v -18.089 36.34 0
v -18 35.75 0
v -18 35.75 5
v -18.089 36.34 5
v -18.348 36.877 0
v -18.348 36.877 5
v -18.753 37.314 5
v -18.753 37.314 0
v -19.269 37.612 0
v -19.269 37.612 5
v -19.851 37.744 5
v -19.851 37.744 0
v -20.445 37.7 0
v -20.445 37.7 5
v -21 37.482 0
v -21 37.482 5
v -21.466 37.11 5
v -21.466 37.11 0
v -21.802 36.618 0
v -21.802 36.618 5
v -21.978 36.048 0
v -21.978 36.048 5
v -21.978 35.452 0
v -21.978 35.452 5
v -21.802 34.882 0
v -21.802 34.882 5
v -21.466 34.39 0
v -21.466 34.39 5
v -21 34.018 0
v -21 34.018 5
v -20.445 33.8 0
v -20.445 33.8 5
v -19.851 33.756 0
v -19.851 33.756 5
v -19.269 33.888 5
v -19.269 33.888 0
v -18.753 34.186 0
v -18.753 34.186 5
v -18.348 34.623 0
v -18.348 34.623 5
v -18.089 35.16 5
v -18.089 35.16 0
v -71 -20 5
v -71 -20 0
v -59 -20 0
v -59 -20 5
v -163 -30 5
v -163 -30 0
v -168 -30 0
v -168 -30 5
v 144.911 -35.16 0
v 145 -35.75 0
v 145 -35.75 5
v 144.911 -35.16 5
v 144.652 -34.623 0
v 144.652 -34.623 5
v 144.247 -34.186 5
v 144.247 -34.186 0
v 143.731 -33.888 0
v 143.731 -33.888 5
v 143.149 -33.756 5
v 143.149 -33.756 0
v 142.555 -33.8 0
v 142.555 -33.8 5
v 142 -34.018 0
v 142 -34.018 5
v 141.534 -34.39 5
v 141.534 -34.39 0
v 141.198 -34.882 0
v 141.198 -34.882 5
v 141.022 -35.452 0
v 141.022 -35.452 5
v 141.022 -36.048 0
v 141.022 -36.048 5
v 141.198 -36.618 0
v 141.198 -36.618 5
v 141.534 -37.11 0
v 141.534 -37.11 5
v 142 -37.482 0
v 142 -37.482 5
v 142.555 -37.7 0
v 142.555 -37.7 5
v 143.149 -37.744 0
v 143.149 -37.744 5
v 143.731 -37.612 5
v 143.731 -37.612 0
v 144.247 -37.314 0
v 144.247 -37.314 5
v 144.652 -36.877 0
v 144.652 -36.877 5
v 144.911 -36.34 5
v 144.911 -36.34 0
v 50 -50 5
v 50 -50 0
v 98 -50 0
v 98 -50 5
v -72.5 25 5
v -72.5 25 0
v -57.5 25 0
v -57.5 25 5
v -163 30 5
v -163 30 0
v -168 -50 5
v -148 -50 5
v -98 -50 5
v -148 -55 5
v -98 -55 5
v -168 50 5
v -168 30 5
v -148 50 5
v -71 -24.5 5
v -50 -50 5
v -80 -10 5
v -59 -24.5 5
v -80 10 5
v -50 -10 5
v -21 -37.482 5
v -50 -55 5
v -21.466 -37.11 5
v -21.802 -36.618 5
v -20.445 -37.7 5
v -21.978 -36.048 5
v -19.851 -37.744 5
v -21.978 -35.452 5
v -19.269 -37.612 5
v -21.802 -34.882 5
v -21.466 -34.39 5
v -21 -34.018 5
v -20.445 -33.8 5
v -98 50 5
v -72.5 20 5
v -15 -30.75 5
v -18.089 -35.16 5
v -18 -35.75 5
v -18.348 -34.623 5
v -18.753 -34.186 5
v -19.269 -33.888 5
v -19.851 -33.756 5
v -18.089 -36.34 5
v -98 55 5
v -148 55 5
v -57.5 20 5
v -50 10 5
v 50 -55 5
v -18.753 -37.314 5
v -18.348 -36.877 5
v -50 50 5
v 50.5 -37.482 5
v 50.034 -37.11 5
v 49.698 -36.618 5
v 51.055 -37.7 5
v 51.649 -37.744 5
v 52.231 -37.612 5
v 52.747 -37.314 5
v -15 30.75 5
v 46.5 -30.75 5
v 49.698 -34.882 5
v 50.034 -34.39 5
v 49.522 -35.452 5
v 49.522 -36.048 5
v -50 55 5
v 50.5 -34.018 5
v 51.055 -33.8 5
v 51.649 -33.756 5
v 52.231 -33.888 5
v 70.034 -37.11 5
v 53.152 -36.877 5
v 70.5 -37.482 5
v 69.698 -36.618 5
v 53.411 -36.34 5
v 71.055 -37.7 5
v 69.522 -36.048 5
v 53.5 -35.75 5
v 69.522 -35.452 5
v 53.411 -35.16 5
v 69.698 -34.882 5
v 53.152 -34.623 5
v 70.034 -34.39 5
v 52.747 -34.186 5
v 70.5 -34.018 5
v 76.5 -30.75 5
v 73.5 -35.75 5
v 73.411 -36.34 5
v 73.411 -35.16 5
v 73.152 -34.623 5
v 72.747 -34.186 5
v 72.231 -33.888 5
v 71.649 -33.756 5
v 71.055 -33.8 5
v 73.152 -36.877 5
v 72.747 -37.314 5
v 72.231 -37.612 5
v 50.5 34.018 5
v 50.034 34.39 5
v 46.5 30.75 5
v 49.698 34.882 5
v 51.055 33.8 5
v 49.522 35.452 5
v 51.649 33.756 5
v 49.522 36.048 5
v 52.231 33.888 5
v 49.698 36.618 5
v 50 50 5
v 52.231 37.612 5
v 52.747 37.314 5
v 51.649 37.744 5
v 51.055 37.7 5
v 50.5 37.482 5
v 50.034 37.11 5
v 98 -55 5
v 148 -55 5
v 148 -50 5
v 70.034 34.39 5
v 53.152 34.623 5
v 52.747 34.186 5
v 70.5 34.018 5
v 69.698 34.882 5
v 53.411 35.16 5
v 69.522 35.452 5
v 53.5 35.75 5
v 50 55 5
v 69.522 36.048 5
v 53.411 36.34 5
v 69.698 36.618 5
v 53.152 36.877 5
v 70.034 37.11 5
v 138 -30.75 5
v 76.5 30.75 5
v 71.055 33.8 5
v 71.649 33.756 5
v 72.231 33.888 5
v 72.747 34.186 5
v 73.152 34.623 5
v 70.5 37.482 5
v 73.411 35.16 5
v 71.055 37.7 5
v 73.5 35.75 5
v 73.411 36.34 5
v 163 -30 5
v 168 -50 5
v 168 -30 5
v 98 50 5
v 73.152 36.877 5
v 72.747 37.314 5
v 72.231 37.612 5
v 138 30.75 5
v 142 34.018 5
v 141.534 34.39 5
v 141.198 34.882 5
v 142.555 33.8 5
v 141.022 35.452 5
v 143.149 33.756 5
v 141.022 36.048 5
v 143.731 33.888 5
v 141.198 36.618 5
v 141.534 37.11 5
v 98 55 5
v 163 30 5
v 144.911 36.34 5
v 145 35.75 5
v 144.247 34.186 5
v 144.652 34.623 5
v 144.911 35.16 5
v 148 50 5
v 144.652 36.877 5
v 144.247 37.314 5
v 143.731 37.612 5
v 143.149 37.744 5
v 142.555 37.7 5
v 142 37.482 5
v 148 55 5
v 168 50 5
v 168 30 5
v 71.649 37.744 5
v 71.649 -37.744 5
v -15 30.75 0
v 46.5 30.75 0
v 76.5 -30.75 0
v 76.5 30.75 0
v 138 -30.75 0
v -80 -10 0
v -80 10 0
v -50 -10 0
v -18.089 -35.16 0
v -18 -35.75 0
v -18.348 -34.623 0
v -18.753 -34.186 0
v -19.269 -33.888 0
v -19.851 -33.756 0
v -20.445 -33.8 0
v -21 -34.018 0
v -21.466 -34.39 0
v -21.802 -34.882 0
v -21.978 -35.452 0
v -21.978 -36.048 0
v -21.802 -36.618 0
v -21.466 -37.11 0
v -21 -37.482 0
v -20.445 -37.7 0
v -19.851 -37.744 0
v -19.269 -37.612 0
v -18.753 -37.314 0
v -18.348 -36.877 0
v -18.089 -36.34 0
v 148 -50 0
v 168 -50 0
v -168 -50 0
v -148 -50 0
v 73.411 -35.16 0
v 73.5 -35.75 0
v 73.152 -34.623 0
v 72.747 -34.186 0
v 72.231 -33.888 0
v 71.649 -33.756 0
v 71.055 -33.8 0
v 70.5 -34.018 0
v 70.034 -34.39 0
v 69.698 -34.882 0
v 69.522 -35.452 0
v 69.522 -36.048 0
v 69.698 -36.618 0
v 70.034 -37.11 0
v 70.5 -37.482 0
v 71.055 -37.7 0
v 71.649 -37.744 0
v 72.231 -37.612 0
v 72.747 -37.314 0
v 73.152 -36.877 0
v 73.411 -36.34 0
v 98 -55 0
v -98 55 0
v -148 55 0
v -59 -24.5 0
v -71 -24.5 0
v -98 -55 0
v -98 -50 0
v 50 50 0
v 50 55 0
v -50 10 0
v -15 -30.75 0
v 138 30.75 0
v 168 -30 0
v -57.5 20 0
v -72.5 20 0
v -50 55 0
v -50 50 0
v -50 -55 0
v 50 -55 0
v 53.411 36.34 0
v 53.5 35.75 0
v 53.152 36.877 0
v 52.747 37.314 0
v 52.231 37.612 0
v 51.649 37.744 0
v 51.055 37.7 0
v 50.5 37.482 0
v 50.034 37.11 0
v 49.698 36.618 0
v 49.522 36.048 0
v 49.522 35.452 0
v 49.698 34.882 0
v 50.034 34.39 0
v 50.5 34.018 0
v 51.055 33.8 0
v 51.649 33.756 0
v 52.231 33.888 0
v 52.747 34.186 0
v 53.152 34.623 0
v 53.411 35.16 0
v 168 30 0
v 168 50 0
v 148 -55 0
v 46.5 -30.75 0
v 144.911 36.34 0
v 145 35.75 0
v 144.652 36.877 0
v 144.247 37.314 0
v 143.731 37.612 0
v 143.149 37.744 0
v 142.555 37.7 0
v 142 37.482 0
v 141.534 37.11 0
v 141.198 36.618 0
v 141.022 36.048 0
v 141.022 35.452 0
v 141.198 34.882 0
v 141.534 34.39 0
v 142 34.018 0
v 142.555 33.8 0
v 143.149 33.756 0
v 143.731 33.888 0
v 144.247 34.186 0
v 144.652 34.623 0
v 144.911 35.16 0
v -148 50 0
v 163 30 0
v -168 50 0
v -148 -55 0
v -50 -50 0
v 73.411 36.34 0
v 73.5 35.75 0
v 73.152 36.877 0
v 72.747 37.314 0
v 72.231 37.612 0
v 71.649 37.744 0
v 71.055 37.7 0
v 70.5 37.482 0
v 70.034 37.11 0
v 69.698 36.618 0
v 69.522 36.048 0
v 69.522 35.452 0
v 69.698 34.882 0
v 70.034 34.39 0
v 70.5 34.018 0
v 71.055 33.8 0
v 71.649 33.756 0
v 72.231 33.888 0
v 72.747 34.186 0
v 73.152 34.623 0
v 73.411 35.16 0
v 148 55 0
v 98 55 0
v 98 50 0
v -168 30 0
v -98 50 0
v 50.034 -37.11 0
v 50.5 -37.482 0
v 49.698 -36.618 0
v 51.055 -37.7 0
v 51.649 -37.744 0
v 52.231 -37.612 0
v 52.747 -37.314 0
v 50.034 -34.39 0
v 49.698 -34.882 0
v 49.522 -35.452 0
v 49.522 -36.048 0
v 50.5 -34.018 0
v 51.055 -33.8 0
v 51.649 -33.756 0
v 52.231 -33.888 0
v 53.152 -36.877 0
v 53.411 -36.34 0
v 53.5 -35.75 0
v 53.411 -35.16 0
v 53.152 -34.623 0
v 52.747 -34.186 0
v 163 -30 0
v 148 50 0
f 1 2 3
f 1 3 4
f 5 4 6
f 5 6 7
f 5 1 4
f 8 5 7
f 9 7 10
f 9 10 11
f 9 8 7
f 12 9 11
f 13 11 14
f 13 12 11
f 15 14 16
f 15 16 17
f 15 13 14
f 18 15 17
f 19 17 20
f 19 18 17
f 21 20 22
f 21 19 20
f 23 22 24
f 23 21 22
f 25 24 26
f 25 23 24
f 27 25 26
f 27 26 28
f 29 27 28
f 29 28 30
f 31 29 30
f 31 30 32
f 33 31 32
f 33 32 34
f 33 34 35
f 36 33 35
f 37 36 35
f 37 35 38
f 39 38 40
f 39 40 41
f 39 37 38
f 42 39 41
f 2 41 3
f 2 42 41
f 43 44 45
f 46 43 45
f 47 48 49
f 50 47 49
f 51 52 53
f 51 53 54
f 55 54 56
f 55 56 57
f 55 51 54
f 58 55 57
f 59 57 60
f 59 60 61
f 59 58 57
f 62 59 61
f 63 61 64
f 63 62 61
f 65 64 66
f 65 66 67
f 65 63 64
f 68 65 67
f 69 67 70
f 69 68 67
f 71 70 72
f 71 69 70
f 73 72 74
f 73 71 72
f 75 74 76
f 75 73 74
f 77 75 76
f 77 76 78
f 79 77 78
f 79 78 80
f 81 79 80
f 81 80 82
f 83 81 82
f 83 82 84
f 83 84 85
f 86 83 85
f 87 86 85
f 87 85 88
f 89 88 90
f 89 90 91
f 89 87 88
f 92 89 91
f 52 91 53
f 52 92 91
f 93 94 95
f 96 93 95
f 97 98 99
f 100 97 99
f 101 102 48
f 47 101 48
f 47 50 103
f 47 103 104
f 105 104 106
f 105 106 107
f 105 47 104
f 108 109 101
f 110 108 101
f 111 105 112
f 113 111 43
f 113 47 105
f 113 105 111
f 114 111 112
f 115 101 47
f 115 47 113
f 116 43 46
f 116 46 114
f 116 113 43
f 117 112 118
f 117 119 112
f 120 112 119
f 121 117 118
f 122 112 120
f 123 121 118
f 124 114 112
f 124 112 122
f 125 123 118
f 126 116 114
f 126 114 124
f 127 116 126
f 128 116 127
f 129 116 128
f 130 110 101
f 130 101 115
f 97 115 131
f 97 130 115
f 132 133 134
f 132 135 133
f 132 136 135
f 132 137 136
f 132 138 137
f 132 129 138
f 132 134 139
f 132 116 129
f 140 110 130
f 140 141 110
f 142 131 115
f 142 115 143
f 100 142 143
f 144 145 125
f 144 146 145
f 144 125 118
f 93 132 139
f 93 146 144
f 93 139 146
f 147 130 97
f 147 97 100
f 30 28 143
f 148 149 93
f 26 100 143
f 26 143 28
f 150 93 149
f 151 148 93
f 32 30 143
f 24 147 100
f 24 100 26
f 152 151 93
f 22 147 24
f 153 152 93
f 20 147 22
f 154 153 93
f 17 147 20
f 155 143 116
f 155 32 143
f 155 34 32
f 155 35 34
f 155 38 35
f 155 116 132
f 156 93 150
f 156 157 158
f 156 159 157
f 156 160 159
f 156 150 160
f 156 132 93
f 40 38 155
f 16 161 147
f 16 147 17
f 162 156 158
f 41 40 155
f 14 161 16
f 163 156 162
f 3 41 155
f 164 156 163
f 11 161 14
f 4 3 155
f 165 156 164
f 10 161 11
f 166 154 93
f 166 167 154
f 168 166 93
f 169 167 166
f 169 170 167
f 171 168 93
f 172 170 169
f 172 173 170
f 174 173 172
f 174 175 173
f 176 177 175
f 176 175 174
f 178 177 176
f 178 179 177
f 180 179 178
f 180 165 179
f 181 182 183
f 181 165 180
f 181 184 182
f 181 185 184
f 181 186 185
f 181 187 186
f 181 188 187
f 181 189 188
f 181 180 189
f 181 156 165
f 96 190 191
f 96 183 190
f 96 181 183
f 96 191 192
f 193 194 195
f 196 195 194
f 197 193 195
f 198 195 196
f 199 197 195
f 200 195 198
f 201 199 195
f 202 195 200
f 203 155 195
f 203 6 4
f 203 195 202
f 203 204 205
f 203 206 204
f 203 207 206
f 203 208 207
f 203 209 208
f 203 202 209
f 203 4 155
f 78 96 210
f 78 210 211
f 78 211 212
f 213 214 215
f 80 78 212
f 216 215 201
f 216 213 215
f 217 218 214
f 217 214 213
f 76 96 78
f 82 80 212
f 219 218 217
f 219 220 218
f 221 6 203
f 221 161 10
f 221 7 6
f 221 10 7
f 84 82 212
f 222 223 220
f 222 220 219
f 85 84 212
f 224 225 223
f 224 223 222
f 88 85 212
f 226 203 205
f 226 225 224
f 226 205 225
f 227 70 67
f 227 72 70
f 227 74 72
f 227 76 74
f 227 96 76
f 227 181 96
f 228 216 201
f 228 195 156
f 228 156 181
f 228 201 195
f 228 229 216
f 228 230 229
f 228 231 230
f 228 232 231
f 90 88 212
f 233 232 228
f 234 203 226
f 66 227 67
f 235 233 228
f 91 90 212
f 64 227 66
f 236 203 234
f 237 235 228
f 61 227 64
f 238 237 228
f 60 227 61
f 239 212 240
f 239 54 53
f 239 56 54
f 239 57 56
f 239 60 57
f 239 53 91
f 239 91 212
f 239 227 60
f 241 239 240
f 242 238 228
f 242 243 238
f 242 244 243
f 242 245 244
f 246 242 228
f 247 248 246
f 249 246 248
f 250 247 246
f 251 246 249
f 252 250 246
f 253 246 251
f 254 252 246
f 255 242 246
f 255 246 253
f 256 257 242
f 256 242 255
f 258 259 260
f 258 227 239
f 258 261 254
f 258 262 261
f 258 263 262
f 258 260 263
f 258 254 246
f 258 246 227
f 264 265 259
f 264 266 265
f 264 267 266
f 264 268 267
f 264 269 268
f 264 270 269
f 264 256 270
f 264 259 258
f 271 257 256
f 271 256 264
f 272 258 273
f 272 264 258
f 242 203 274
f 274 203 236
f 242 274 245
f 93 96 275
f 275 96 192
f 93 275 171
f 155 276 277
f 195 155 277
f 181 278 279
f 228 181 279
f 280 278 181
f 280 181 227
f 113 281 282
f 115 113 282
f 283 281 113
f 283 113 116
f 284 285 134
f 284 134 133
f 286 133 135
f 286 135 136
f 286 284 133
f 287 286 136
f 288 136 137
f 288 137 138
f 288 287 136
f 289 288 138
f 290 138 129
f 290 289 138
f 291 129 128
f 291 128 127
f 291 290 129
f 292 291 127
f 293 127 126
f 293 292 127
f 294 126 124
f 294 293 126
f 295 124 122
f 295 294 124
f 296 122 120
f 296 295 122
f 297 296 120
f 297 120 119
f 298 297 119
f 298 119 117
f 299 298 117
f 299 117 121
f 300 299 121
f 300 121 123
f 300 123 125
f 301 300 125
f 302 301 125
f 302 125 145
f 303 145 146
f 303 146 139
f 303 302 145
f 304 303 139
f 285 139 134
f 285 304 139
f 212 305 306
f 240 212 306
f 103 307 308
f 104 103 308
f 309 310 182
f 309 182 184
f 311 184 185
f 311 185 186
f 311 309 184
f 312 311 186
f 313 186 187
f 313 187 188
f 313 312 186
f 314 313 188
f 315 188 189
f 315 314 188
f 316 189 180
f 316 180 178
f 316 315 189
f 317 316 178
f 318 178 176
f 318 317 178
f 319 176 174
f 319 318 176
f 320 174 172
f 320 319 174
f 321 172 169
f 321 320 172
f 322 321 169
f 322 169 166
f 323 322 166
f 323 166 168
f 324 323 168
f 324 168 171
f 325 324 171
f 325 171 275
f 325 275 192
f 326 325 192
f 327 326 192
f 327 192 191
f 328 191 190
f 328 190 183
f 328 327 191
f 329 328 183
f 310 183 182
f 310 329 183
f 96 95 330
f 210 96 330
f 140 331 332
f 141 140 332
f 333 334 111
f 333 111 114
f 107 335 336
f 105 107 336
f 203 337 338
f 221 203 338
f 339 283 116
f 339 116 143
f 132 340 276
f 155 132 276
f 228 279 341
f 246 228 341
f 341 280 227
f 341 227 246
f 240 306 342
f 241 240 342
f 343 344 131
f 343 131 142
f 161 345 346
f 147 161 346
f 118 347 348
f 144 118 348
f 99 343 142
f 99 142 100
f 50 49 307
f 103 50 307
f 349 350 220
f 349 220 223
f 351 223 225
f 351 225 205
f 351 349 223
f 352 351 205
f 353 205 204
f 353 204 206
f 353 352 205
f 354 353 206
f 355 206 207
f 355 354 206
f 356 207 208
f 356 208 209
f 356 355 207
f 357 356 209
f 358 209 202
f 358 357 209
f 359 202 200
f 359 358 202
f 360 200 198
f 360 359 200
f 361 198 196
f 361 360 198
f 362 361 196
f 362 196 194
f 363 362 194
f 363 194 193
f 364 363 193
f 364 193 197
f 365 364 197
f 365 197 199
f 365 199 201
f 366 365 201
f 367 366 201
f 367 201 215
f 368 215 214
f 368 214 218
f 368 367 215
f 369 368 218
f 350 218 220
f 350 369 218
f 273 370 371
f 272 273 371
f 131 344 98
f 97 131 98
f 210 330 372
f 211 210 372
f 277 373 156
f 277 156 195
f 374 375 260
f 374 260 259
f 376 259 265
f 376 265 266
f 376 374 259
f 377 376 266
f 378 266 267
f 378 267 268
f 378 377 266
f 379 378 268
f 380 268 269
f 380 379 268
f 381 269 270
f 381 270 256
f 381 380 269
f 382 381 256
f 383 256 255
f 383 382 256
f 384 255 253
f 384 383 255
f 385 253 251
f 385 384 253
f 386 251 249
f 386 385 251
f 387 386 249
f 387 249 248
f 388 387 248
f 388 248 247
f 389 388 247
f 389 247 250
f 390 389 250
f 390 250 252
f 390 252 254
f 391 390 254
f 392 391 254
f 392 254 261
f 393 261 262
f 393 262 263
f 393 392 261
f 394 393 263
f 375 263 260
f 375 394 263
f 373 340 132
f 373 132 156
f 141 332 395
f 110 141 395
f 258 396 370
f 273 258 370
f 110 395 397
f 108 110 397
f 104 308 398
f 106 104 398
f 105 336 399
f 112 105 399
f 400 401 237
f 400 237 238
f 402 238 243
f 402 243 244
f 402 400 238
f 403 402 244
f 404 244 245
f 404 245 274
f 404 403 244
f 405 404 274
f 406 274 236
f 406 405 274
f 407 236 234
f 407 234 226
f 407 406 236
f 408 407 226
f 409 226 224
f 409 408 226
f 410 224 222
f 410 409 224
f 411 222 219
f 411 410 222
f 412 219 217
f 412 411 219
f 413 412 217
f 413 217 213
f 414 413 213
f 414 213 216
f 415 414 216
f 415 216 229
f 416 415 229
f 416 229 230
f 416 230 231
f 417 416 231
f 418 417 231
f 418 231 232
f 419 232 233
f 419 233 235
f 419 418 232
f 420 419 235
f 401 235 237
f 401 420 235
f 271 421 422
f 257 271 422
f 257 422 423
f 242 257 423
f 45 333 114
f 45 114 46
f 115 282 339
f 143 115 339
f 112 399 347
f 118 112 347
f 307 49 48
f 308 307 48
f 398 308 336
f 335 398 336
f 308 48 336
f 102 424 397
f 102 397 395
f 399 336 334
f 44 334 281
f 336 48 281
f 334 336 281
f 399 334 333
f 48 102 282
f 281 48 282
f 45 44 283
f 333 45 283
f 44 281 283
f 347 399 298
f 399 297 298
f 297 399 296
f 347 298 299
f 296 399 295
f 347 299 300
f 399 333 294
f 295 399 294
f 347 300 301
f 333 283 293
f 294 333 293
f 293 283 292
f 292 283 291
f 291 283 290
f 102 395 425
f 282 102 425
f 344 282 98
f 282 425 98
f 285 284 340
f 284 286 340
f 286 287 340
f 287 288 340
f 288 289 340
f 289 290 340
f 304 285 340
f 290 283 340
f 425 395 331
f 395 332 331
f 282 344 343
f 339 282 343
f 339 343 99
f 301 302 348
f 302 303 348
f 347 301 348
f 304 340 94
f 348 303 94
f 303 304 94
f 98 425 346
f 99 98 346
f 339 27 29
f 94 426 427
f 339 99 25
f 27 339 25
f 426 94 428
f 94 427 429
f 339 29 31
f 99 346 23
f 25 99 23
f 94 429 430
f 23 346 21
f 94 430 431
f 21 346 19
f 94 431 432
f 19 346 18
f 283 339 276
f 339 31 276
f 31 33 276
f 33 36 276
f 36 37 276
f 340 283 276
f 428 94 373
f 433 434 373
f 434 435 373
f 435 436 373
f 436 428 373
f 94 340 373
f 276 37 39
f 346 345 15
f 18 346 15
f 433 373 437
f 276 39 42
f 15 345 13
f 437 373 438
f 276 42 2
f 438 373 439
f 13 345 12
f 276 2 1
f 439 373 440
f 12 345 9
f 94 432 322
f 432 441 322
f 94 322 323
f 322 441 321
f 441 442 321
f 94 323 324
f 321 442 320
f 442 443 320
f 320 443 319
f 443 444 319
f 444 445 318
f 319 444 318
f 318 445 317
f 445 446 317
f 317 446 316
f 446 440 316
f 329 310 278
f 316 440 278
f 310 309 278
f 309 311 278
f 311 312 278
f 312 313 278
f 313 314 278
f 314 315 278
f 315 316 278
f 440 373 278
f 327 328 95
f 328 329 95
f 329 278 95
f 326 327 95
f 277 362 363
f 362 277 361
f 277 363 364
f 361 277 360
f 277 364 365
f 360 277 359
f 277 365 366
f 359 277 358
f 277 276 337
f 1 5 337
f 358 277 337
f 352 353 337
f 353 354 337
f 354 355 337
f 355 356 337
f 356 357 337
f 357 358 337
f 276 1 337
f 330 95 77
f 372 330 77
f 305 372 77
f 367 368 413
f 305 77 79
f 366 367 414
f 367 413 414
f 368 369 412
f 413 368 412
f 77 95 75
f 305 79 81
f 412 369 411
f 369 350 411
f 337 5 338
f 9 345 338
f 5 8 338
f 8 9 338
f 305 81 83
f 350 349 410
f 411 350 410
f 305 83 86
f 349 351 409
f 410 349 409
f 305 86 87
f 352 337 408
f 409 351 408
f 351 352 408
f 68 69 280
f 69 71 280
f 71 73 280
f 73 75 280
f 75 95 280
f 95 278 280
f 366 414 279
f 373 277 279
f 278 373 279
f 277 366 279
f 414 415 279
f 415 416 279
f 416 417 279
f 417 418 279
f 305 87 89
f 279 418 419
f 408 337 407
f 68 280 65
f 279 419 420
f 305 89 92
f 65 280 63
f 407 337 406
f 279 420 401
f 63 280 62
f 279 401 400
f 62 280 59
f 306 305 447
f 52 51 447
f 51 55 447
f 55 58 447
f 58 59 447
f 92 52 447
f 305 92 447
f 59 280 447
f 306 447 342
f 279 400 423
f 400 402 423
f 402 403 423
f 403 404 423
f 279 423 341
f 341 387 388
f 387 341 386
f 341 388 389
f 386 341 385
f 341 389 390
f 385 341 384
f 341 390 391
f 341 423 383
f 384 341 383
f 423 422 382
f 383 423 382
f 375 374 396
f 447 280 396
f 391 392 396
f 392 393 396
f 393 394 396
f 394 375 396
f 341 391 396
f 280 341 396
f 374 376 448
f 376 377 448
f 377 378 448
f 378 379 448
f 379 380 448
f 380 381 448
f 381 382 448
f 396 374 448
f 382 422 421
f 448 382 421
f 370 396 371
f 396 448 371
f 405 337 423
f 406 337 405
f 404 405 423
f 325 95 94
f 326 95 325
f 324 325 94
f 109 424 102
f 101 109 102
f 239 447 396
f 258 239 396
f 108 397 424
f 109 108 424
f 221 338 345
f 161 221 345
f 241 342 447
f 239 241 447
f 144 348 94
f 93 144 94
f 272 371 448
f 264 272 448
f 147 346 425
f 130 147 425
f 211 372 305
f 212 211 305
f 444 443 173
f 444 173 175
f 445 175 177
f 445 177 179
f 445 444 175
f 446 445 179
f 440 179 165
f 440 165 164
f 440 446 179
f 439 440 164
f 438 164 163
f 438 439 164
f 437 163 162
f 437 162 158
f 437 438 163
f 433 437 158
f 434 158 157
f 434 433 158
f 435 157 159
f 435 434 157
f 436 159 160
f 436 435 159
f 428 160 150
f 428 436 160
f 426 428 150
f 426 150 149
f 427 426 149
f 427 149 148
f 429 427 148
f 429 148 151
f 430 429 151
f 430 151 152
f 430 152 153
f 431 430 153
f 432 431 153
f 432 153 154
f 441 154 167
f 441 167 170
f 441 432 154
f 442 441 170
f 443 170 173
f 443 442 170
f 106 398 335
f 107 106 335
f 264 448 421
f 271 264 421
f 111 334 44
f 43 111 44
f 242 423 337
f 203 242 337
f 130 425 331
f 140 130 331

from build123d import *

# Parameters (mm, degrees)
SKETCH1_R           = 2
SKETCH1_W           = 12
SKETCH1_H           = 4.5
SKETCH1_W_2         = 61.5
SKETCH1_H_2         = 61.5
SKETCH1_W_3         = 30
SKETCH1_H_3         = 20
SKETCH1_W_4         = 15
SKETCH1_H_4         = 5
BOSS_EXTRUDE1_DEPTH = 5


with BuildPart() as part:
    # Sketch1 → Boss-Extrude1 (new body)
    with BuildSketch(Plane.XY):
        Polygon((148, -50), (168, -50), (168, -30), (163, -30), (163, 30), (168, 30), (168, 50), (148, 50), (148, 55), (98, 55), (98, 50), (50, 50), (50, 55), (-50, 55), (-50, 50), (-98, 50), (-98, 55), (-148, 55), (-148, 50), (-168, 50), (-168, 30), (-163, 30), (-163, -30), (-168, -30), (-168, -50), (-148, -50), (-148, -55), (-98, -55), (-98, -50), (-50, -50), (-50, -55), (50, -55), (50, -50), (98, -50), (98, -55), (148, -55), align=None)
        with Locations((-20, -35.75)):
            Circle(SKETCH1_R, mode=Mode.SUBTRACT)
        with Locations((-65, -22.25)):
            Rectangle(SKETCH1_W, SKETCH1_H, mode=Mode.SUBTRACT)
        with Locations((51.5, -35.75)):
            Circle(SKETCH1_R, mode=Mode.SUBTRACT)
        with Locations((71.5, -35.75)):
            Circle(SKETCH1_R, mode=Mode.SUBTRACT)
        with Locations((143, -35.75)):
            Circle(SKETCH1_R, mode=Mode.SUBTRACT)
        with Locations((15.75, 0)):
            Rectangle(SKETCH1_W_2, SKETCH1_H_2, mode=Mode.SUBTRACT)
        with Locations((-65, 0)):
            Rectangle(SKETCH1_W_3, SKETCH1_H_3, mode=Mode.SUBTRACT)
        with Locations((-65, 22.5)):
            Rectangle(SKETCH1_W_4, SKETCH1_H_4, mode=Mode.SUBTRACT)
        with Locations((-20, 35.75)):
            Circle(SKETCH1_R, mode=Mode.SUBTRACT)
        with Locations((107.25, 0)):
            Rectangle(SKETCH1_W_2, SKETCH1_H_2, mode=Mode.SUBTRACT)
        with Locations((51.5, 35.75)):
            Circle(SKETCH1_R, mode=Mode.SUBTRACT)
        with Locations((71.5, 35.75)):
            Circle(SKETCH1_R, mode=Mode.SUBTRACT)
        with Locations((143, 35.75)):
            Circle(SKETCH1_R, mode=Mode.SUBTRACT)
    extrude(amount=BOSS_EXTRUDE1_DEPTH)


solid = part.part
